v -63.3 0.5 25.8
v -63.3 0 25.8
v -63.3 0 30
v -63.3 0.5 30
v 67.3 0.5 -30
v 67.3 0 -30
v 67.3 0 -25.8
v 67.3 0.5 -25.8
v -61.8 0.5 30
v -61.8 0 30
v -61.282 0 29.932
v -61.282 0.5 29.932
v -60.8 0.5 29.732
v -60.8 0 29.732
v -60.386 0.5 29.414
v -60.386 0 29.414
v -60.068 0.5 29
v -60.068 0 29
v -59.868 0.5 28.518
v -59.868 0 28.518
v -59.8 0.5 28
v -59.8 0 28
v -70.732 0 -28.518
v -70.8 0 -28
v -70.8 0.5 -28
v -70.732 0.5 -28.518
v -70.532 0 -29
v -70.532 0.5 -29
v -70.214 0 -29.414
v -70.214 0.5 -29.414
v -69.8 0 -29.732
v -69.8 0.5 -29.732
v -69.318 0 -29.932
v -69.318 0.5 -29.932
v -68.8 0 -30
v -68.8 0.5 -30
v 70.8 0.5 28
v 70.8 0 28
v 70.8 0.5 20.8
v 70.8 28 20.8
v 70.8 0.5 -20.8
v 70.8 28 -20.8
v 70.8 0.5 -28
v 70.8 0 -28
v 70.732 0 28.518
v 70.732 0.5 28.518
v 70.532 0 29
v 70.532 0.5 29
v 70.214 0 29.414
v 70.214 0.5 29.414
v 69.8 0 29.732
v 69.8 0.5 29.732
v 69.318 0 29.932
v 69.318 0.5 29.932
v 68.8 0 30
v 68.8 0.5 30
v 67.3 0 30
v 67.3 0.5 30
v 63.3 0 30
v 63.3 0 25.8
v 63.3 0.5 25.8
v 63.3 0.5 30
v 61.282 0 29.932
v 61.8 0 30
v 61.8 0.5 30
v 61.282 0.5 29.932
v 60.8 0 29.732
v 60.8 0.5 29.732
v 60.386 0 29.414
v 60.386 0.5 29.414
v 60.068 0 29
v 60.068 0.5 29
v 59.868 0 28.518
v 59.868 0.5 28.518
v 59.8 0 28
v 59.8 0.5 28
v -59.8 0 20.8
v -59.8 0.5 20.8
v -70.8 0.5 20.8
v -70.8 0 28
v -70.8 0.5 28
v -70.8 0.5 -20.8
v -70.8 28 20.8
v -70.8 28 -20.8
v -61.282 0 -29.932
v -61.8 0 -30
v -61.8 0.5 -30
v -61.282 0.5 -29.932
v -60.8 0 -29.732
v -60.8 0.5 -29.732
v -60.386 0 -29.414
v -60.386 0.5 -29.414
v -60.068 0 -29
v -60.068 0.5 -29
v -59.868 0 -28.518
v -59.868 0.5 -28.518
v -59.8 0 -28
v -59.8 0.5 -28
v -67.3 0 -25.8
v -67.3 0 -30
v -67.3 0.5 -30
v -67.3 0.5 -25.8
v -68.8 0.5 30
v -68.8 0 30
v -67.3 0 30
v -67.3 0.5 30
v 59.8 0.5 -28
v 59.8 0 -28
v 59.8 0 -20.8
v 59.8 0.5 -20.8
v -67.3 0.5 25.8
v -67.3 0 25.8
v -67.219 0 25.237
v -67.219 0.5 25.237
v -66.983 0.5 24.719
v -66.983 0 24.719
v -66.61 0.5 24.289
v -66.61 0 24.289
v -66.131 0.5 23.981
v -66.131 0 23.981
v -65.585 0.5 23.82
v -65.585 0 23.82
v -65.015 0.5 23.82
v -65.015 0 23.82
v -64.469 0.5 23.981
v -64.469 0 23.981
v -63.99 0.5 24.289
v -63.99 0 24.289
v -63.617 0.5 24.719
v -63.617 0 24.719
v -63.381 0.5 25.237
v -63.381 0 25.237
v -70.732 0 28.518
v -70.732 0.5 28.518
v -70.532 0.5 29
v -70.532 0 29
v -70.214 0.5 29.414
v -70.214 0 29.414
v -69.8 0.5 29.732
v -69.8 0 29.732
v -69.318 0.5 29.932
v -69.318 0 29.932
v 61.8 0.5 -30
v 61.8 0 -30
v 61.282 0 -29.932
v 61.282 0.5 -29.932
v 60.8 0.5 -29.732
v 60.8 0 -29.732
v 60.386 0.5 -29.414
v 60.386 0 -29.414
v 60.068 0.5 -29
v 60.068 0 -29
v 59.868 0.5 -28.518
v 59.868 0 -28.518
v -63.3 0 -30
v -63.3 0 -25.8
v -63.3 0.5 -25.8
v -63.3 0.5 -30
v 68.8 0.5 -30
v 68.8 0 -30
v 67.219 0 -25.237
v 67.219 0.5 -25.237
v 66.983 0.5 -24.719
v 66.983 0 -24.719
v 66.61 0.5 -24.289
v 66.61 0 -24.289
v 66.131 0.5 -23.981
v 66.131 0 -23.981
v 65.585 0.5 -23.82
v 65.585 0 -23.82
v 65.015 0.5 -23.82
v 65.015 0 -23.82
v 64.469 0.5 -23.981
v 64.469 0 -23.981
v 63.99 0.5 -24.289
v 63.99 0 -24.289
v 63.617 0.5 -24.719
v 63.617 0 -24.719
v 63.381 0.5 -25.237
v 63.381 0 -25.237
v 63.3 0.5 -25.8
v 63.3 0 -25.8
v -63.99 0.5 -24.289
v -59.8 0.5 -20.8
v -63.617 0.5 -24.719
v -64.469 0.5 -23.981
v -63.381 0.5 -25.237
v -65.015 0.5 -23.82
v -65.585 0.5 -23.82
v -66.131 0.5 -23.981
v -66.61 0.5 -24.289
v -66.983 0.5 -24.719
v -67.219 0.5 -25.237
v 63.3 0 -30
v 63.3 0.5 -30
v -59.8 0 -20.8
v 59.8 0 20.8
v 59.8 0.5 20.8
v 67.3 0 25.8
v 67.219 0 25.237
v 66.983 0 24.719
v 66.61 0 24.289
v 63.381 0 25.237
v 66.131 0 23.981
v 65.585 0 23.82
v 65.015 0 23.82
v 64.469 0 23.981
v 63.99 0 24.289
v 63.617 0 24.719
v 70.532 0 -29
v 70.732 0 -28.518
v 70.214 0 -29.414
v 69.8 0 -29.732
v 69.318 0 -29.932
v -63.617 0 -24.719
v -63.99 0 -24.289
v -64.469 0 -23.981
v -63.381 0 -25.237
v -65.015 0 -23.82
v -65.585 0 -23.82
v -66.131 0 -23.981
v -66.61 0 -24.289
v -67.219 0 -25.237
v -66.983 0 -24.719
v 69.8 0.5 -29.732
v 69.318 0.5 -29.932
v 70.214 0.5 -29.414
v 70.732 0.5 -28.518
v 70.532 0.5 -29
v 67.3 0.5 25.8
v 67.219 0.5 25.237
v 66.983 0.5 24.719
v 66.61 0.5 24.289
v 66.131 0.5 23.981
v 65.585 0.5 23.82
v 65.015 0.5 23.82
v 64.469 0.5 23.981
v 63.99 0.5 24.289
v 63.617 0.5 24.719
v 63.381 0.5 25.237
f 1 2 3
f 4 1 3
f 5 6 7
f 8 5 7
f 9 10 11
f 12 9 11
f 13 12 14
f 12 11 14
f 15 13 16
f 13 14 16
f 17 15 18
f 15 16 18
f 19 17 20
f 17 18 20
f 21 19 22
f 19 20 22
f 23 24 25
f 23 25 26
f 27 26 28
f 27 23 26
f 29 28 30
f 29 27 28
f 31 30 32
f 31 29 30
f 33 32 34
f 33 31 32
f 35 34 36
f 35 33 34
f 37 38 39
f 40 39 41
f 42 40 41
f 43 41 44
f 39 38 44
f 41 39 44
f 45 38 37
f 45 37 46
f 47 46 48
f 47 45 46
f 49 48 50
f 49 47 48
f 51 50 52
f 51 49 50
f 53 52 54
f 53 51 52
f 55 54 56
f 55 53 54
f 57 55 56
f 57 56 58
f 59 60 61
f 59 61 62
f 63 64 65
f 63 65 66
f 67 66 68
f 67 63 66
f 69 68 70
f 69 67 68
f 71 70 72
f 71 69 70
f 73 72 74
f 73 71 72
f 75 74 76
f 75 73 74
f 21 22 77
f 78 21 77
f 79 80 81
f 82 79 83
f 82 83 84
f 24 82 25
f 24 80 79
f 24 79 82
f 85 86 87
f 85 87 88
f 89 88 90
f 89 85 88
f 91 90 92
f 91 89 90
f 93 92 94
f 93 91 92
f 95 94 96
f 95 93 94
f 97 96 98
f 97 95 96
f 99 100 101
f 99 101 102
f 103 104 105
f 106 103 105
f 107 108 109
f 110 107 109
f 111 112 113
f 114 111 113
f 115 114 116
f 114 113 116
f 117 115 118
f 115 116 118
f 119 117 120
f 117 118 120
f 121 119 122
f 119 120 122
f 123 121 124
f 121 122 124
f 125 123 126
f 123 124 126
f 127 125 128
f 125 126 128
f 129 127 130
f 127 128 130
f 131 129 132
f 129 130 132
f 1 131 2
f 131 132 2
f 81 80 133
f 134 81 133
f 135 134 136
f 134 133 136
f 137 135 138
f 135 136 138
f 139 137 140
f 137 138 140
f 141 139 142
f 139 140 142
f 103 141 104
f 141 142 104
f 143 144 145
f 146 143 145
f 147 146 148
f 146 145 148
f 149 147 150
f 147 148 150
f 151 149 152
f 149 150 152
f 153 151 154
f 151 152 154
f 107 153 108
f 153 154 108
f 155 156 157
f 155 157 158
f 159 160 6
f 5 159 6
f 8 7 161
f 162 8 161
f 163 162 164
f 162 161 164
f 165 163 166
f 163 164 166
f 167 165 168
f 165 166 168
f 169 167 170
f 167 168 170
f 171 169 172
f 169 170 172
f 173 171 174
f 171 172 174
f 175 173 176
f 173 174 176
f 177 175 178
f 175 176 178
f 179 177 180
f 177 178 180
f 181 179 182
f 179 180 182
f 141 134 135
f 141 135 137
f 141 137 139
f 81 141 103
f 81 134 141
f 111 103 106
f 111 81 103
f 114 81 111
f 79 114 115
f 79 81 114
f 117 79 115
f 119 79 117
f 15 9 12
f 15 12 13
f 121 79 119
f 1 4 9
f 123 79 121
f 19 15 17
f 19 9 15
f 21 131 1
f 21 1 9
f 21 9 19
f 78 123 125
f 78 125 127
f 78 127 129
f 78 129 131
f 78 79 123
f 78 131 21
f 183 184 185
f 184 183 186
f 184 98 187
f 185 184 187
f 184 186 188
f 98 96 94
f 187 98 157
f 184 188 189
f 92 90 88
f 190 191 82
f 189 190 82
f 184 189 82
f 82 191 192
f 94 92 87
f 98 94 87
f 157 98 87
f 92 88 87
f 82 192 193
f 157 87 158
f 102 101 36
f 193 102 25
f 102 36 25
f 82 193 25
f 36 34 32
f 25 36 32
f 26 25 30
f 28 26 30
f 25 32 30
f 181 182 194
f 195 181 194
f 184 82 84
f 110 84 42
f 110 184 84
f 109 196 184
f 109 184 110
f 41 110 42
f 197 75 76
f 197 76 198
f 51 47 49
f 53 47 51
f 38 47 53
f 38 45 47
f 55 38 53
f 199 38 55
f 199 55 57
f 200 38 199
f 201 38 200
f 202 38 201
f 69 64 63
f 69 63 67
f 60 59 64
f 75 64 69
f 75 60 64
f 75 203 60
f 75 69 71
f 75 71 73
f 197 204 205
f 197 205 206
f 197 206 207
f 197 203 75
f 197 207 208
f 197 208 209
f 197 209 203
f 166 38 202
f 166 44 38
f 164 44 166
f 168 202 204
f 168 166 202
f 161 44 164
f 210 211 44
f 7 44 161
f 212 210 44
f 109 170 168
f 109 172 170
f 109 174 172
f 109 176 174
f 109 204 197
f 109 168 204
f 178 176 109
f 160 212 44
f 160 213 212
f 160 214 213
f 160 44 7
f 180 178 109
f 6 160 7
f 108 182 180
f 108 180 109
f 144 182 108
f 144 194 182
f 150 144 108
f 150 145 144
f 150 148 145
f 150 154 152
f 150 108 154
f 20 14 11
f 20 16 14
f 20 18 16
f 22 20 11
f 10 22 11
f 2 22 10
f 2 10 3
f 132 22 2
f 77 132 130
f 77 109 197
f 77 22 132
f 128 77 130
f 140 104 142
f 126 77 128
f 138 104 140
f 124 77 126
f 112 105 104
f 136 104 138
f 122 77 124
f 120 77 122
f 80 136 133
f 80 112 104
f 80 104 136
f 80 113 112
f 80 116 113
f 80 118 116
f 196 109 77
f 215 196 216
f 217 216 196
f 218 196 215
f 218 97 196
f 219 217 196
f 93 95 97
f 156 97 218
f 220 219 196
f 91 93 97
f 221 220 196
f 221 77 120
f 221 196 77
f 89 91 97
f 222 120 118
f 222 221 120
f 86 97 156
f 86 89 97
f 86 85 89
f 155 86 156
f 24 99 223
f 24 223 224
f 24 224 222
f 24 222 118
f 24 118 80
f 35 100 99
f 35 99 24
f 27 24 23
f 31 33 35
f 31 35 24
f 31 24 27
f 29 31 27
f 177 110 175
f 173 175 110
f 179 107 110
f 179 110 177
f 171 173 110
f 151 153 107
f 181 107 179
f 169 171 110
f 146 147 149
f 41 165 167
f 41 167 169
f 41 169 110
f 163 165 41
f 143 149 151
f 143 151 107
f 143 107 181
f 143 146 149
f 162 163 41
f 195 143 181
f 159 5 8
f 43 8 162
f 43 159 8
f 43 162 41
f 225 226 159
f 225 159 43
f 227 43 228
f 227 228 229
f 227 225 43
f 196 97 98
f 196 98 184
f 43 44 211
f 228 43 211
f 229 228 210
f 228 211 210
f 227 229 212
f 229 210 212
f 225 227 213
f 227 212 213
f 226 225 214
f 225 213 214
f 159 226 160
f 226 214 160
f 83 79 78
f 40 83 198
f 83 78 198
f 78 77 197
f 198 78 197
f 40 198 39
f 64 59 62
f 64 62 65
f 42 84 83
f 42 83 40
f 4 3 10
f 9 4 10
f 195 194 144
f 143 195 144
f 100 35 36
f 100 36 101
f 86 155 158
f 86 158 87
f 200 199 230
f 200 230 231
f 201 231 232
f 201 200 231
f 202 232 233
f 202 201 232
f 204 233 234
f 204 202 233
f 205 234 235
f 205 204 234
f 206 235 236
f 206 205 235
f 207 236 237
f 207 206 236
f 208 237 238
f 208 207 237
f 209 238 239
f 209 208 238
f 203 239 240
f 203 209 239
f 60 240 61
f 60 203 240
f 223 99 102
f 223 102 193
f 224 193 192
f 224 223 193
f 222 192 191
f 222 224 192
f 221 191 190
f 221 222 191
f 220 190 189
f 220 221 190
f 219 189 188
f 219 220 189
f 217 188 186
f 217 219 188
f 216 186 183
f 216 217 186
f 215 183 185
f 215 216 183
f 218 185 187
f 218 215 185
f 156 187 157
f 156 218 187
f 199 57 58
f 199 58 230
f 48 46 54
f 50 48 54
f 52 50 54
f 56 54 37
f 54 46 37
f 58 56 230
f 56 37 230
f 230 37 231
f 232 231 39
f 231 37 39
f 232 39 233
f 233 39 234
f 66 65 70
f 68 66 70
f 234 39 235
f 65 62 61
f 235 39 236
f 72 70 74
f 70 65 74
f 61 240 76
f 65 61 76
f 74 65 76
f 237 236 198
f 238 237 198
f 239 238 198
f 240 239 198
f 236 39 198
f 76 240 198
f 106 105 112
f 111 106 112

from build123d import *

# Parameters (mm, degrees)
SCHIZZO1_W                   = 141.6
SCHIZZO1_H                   = 41.6
ESTRUSIONE_ESTRUSIONE1_DEPTH = 28
ESTRUSIONE_ESTRUSIONE2_DEPTH = 0.5


with BuildPart() as part:
    # Schizzo1 → Estrusione-Estrusione1 (new body)
    with BuildSketch(Plane(origin=(0, 0, 0), x_dir=(1, 0, 0), z_dir=(0, 1, 0))):
        Rectangle(SCHIZZO1_W, SCHIZZO1_H)
    extrude(amount=ESTRUSIONE_ESTRUSIONE1_DEPTH)

    # Schizzo2 → Estrusione-Estrusione2 (add)
    with BuildSketch(Plane(origin=(0, 0, 0), x_dir=(1, 0, 0), z_dir=(0, 1, 0))):
        with BuildLine():
            Line((-70.8, 20.8), (-70.8, 28))
            ThreePointArc((-70.8, 28), (-70.214213562, 29.414213562), (-68.8, 30))
            Line((-68.8, 30), (-67.3, 30))
            Line((-67.3, 30), (-67.3, 25.8))
            ThreePointArc((-67.3, 25.8), (-65.3, 23.8), (-63.3, 25.8))
            Line((-63.3, 25.8), (-63.3, 30))
            Line((-63.3, 30), (-61.8, 30))
            ThreePointArc((-61.8, 30), (-60.385786438, 29.414213562), (-59.8, 28))
            Line((-59.8, 28), (-59.8, 20.8))
            Line((-59.8, 20.8), (-70.8, 20.8))
        make_face()
        with BuildLine():
            Line((-63.3, -30), (-61.8, -30))
            ThreePointArc((-61.8, -30), (-60.385786438, -29.414213562), (-59.8, -28))
            Line((-59.8, -28), (-59.8, -20.8))
            Line((-59.8, -20.8), (-70.8, -20.8))
            Line((-70.8, -20.8), (-70.8, -28))
            ThreePointArc((-70.8, -28), (-70.214213562, -29.414213562), (-68.8, -30))
            Line((-68.8, -30), (-67.3, -30))
            Line((-67.3, -30), (-67.3, -25.8))
            ThreePointArc((-67.3, -25.8), (-65.3, -23.8), (-63.3, -25.8))
            Line((-63.3, -25.8), (-63.3, -30))
        make_face()
        with BuildLine():
            Line((63.3, -30), (61.8, -30))
            ThreePointArc((61.8, -30), (60.385786438, -29.414213562), (59.8, -28))
            Line((59.8, -28), (59.8, -20.8))
            Line((59.8, -20.8), (70.8, -20.8))
            Line((70.8, -20.8), (70.8, -28))
            ThreePointArc((70.8, -28), (70.214213562, -29.414213562), (68.8, -30))
            Line((68.8, -30), (67.3, -30))
            Line((67.3, -30), (67.3, -25.8))
            ThreePointArc((67.3, -25.8), (65.3, -23.8), (63.3, -25.8))
            Line((63.3, -25.8), (63.3, -30))
        make_face()
        with BuildLine():
            Line((63.3, 30), (61.8, 30))
            ThreePointArc((61.8, 30), (60.385786438, 29.414213562), (59.8, 28))
            Line((59.8, 28), (59.8, 20.8))
            Line((59.8, 20.8), (70.8, 20.8))
            Line((70.8, 20.8), (70.8, 28))
            ThreePointArc((70.8, 28), (70.214213562, 29.414213562), (68.8, 30))
            Line((68.8, 30), (67.3, 30))
            Line((67.3, 30), (67.3, 25.8))
            ThreePointArc((67.3, 25.8), (65.3, 23.8), (63.3, 25.8))
            Line((63.3, 25.8), (63.3, 30))
        make_face()
    extrude(amount=ESTRUSIONE_ESTRUSIONE2_DEPTH)


solid = part.part
